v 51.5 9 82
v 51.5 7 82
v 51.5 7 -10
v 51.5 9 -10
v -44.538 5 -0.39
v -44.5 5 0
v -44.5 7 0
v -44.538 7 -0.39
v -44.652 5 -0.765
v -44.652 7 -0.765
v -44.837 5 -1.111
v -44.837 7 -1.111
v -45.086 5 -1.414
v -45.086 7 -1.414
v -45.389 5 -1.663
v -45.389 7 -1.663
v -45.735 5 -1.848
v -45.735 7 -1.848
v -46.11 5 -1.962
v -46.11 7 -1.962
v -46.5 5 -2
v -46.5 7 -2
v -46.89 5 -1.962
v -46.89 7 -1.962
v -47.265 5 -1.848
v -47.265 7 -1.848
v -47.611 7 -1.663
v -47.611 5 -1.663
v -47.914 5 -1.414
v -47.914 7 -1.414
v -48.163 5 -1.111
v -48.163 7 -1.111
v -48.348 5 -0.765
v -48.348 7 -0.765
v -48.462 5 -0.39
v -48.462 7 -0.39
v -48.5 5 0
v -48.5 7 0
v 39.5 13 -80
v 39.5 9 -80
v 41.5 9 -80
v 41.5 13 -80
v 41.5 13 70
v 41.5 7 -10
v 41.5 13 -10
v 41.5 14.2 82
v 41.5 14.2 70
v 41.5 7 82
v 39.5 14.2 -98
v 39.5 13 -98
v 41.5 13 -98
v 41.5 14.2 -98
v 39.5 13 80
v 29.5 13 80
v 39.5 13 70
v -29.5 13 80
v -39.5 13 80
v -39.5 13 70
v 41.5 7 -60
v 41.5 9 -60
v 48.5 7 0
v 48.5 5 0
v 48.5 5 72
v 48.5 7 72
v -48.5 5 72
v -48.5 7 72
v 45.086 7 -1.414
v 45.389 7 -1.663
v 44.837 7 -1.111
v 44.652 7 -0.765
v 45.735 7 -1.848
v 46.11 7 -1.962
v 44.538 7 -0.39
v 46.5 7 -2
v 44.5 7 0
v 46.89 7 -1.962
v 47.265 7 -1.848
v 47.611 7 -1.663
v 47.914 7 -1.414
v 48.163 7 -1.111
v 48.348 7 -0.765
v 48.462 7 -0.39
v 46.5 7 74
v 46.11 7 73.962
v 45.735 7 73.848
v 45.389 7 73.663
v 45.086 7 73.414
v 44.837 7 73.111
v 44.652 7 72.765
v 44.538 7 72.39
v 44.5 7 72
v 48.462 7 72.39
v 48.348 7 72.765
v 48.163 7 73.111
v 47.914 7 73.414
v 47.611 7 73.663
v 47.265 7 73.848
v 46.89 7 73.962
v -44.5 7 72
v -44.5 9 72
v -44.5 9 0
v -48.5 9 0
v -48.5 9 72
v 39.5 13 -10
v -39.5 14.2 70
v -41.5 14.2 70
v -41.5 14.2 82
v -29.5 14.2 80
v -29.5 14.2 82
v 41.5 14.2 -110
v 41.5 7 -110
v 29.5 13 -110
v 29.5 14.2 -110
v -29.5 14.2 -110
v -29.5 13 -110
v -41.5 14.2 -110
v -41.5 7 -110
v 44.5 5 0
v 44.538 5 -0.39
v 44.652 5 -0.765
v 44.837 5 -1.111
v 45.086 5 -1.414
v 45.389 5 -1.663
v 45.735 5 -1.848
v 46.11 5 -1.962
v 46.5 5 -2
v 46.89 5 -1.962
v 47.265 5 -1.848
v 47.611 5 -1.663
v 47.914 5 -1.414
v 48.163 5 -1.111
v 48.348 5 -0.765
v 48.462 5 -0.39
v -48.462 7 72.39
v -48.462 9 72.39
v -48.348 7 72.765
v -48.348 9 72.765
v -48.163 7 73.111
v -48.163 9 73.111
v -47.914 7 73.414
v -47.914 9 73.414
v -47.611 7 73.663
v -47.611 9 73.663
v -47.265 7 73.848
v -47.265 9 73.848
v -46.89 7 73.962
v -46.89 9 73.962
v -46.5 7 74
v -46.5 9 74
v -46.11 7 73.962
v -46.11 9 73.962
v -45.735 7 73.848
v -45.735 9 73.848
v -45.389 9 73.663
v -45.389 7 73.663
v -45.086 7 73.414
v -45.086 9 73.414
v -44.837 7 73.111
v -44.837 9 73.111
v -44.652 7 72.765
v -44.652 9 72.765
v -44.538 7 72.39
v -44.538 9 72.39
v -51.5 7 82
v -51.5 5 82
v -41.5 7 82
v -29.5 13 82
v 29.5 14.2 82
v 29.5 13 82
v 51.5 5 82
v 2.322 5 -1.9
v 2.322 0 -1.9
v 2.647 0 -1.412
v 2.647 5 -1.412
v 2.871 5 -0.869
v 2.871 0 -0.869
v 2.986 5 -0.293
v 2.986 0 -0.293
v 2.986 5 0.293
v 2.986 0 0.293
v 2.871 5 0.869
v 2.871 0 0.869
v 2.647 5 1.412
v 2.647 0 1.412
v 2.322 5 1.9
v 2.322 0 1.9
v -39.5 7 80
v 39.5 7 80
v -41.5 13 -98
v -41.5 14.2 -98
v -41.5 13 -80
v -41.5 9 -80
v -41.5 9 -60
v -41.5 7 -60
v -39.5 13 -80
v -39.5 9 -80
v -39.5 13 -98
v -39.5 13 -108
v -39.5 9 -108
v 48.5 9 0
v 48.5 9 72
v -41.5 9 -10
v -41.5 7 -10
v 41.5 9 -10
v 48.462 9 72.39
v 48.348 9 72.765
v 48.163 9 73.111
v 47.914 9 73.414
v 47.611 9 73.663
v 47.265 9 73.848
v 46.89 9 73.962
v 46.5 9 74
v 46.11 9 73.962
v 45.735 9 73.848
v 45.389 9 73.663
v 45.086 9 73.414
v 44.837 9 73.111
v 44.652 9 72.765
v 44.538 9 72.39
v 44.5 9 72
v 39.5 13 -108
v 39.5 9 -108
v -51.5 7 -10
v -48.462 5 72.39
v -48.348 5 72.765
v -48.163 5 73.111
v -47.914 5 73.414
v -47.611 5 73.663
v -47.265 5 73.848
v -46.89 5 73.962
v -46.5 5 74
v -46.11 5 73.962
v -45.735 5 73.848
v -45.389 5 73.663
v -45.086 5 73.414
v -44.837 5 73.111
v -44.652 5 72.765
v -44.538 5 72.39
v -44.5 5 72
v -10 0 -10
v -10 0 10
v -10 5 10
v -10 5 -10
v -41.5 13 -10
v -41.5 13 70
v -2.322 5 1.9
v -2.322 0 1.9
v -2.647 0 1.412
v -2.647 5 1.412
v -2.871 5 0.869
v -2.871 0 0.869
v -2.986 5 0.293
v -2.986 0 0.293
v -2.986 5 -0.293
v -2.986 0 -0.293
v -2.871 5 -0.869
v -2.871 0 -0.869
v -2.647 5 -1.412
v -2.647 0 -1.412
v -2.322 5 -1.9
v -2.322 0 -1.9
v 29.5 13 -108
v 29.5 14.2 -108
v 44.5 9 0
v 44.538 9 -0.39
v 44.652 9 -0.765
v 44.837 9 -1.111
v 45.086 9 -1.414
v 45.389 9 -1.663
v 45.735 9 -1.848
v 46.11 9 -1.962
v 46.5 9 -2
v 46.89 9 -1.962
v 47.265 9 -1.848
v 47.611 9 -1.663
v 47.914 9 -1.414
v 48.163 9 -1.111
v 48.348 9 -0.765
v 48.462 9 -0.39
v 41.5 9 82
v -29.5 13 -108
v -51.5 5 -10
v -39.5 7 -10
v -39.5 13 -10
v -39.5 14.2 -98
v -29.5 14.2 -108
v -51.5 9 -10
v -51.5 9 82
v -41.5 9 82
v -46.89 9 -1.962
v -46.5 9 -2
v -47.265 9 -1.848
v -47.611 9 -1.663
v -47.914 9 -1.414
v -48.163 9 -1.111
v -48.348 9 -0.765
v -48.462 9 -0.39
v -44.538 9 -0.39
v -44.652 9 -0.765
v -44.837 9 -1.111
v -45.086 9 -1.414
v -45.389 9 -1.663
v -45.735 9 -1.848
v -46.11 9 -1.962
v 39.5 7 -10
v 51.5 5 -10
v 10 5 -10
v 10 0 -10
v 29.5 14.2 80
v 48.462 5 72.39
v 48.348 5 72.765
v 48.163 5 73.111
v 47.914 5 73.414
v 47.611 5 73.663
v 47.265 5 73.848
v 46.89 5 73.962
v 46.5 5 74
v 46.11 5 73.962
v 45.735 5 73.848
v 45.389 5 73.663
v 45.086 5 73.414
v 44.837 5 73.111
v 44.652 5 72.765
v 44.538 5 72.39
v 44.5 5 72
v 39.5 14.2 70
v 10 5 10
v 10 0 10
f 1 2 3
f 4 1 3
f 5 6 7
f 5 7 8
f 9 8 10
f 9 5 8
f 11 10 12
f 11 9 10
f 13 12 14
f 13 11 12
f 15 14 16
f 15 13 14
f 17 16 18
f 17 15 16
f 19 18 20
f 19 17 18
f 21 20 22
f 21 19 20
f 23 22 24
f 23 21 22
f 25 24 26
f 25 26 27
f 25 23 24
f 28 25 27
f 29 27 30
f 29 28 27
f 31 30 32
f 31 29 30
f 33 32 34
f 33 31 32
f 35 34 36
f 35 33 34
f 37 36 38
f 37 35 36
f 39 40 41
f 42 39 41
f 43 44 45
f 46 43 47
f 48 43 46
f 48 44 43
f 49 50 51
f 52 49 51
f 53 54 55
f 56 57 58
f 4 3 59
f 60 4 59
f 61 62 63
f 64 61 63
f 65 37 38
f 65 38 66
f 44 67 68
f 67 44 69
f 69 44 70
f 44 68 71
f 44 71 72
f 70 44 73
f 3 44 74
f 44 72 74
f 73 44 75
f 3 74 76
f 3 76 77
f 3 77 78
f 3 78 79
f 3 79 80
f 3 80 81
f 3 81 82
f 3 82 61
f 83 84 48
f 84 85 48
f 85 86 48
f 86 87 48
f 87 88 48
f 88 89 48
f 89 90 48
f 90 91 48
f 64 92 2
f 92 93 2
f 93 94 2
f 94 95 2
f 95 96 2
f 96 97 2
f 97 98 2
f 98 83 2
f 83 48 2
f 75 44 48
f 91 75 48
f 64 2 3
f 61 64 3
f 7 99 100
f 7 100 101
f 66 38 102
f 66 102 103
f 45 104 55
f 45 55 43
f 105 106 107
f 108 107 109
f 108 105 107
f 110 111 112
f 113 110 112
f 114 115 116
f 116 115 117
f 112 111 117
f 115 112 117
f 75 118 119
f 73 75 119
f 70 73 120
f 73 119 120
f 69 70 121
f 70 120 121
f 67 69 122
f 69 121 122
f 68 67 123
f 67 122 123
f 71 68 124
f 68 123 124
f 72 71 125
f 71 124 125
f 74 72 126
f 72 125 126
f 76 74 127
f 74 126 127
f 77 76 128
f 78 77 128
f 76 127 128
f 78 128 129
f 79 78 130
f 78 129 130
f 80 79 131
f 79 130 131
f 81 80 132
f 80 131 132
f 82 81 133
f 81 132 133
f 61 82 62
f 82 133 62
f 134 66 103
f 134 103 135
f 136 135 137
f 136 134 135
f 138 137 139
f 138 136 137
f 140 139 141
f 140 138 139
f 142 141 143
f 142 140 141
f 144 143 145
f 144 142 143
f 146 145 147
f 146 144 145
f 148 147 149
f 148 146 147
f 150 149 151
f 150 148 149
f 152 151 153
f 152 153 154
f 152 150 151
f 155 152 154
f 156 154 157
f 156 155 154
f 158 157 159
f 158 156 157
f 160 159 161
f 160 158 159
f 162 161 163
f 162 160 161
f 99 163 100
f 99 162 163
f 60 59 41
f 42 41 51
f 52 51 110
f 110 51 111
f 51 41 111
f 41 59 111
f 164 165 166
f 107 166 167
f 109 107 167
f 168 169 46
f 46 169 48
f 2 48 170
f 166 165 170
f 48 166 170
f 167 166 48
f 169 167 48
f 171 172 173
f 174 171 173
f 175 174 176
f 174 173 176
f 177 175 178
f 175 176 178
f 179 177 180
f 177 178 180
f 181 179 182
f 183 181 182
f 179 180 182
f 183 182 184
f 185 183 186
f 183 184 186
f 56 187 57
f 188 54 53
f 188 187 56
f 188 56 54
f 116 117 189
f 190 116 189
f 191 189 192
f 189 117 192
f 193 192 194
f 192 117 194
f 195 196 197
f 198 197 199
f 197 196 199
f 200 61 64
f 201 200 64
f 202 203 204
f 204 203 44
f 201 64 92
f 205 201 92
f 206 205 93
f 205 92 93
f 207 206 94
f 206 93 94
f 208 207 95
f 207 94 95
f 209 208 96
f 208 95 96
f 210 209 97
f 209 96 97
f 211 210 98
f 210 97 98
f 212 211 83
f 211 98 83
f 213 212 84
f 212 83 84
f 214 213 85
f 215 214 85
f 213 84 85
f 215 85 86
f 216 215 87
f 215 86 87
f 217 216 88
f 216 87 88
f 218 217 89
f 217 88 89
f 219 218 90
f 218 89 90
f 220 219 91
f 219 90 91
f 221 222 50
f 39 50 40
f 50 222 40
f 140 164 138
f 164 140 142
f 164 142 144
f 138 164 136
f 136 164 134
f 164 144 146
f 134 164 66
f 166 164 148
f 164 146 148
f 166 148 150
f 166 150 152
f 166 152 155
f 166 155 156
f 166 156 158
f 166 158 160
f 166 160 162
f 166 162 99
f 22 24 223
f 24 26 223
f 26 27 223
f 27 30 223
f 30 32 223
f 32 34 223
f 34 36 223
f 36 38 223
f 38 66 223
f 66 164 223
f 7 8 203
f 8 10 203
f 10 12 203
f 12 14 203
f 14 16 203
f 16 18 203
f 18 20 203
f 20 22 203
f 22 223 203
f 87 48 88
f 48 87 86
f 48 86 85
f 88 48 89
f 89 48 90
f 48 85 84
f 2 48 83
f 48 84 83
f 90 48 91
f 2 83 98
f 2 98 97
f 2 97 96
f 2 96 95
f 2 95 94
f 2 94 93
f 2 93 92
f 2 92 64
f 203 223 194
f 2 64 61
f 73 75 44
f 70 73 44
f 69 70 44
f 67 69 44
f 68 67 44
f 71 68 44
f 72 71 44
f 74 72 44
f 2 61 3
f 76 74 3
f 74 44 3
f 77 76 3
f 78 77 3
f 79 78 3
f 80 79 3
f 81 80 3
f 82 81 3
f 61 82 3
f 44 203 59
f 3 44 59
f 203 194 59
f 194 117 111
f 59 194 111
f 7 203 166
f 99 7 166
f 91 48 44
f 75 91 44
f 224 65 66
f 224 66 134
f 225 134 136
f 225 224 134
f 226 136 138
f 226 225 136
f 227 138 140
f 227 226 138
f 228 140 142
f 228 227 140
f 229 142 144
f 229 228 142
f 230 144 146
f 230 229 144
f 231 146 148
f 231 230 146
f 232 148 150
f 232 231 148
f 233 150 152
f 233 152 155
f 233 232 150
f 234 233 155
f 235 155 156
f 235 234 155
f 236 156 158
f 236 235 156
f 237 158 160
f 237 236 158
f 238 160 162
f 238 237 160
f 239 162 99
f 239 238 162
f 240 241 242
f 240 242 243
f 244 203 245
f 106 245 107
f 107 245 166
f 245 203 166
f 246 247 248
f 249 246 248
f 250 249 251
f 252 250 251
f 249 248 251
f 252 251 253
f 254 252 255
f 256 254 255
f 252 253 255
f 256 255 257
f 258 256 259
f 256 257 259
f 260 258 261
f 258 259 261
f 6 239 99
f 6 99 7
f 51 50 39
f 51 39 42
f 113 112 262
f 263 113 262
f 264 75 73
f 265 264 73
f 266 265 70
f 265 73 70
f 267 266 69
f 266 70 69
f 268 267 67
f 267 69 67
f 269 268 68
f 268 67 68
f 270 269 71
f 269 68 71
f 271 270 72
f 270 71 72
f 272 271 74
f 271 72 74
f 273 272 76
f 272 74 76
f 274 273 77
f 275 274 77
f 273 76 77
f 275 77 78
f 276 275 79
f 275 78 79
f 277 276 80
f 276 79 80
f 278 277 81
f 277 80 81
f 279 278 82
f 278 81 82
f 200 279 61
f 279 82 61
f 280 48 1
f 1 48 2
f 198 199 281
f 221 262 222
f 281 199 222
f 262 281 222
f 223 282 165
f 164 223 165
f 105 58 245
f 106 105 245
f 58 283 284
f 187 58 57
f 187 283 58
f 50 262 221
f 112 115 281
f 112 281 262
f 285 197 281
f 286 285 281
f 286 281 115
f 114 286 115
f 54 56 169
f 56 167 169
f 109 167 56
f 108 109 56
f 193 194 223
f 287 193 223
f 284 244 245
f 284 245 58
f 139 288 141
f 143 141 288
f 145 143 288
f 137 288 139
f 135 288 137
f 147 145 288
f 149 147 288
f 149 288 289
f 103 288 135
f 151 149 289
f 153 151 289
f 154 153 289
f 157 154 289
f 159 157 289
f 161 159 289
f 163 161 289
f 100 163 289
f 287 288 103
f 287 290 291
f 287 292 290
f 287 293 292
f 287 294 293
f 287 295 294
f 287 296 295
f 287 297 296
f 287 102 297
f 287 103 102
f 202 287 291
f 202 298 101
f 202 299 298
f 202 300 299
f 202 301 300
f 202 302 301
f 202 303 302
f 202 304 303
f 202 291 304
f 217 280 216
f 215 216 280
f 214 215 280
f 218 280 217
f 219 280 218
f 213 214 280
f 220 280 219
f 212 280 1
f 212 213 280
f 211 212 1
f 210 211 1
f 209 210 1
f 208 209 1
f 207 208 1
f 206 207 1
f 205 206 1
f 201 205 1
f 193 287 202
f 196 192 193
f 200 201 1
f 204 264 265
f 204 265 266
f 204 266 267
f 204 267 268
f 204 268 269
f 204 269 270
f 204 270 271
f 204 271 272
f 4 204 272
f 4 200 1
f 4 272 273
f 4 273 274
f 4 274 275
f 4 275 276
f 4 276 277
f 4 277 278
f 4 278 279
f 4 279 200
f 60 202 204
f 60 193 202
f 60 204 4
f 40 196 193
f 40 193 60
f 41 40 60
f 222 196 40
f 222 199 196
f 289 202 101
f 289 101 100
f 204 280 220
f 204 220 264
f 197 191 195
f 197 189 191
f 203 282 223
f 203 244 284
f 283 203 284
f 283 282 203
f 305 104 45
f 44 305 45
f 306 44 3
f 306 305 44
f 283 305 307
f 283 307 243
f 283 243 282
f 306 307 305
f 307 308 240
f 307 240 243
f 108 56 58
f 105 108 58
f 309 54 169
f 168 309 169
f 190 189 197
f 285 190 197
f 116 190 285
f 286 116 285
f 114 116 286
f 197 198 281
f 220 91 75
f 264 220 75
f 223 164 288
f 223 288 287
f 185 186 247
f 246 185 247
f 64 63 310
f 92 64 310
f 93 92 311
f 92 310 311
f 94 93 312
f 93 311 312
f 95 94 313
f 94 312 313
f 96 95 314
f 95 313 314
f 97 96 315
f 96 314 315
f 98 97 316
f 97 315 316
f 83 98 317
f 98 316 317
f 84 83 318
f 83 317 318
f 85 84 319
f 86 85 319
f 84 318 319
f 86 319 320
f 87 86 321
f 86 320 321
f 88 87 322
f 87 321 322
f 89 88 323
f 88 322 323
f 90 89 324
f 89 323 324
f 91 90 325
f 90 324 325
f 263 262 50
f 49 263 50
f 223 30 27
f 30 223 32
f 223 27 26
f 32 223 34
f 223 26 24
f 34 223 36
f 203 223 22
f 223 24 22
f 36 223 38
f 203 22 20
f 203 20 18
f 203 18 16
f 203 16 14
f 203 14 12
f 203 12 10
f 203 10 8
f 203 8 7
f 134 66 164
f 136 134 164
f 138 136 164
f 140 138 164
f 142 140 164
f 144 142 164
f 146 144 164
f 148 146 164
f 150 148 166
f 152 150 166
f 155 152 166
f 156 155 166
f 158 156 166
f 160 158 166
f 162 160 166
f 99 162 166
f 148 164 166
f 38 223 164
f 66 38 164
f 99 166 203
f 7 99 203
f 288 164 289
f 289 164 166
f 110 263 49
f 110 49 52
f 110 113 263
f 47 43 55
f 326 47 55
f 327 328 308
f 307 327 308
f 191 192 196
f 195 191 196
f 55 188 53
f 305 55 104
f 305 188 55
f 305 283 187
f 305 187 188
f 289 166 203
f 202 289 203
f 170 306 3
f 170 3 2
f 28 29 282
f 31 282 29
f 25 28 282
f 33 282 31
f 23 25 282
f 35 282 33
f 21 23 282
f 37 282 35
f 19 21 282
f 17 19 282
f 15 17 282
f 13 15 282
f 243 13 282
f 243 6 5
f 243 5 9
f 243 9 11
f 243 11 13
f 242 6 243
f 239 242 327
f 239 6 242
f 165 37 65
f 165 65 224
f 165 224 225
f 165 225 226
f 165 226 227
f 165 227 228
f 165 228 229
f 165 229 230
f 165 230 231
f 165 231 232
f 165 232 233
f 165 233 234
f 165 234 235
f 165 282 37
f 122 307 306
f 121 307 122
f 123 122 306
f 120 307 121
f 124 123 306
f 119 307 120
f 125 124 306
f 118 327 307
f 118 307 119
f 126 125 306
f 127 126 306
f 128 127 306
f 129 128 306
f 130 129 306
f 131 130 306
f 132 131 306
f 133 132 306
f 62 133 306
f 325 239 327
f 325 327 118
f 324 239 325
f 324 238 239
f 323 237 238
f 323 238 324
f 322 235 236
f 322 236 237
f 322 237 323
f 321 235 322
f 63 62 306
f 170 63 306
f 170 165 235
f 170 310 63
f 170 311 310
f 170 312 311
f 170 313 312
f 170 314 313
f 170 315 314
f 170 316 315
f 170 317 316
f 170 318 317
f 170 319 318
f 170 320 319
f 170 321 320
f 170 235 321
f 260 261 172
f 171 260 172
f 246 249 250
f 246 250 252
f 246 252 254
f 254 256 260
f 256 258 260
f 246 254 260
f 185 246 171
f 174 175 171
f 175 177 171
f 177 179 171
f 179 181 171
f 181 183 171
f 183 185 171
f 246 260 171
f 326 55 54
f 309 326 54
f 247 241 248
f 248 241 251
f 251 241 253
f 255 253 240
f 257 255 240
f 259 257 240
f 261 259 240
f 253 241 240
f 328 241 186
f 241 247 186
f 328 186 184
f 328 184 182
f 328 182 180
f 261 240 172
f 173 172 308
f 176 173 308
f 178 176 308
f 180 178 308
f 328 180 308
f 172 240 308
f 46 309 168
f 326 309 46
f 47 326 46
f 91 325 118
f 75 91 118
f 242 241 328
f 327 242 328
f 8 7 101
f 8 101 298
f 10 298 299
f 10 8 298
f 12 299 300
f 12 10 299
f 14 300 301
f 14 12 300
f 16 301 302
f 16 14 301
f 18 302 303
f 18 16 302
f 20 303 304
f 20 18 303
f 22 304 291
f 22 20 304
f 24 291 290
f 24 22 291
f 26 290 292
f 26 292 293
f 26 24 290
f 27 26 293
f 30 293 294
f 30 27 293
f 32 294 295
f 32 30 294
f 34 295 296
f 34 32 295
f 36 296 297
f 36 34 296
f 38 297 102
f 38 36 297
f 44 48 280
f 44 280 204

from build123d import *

# Parameters (mm, degrees)
CROQUIS1_W              = 20
CROQUIS1_H              = 20
CROQUIS1_R              = 3
SALIENTE_EXTRUIR1_DEPTH = 5
SALIENTE_EXTRUIR2_DEPTH = 2
SALIENTE_EXTRUIR3_DEPTH = 8
SALIENTE_EXTRUIR4_DEPTH = 1.2
CROQUIS5_W              = 10
CROQUIS5_H              = 92
SALIENTE_EXTRUIR5_DEPTH = 2
CROQUIS6_W              = 83
CROQUIS6_H              = 100
CROQUIS6_W_2            = 10
CROQUIS6_H_2            = 92
SALIENTE_EXTRUIR6_DEPTH = 2
SALIENTE_EXTRUIR7_DEPTH = 4
SALIENTE_EXTRUIR8_DEPTH = 1.2


with BuildPart() as part:
    # Croquis1 → Saliente-Extruir1 (new body)
    with BuildSketch(Plane(origin=(0, 0, 0), x_dir=(1, 0, 0), z_dir=(0, 1, 0))):
        Rectangle(CROQUIS1_W, CROQUIS1_H)
        Circle(CROQUIS1_R, mode=Mode.SUBTRACT)
        with BuildLine():
            Line((2.321637353, -1.9), (-2.321637353, -1.9))
            ThreePointArc((-2.321637353, -1.9), (0, -3), (2.321637353, -1.9))
        make_face()
        with BuildLine():
            Line((-2.321637353, 1.9), (2.321637353, 1.9))
            ThreePointArc((2.321637353, 1.9), (0, 3), (-2.321637353, 1.9))
        make_face()
    extrude(amount=SALIENTE_EXTRUIR1_DEPTH)

    # Croquis2 → Saliente-Extruir2 (add)
    with BuildSketch(Plane(origin=(0, 5, 0), x_dir=(1, 0, 0), z_dir=(0, 1, 0))):
        Polygon((-10, 10), (-39.5, 10), (-39.5, 0), (-39.5, -80), (39.5, -80), (39.5, 0), (39.5, 10), (10, 10), align=None)
    extrude(amount=SALIENTE_EXTRUIR2_DEPTH)

    # Croquis3 → Saliente-Extruir3 (add)
    with BuildSketch(Plane.XZ.offset(-5)):
        Polygon((39.5, 80), (39.5, -10), (41.5, -10), (41.5, 82), (-41.5, 82), (-41.5, -10), (-39.5, -10), (-39.5, 80), align=None)
    extrude(amount=-SALIENTE_EXTRUIR3_DEPTH)

    # Croquis4 → Saliente-Extruir4 (add)
    with BuildSketch(Plane(origin=(0, 13, 0), x_dir=(1, 0, 0), z_dir=(0, 1, 0))):
        Polygon((-39.5, -80), (-29.5, -80), (-39.5, -70), align=None)
        Polygon((-29.5, -82), (-29.5, -80), (-39.5, -80), (-39.5, -70), (-41.5, -70), (-41.5, -82), align=None)
        Polygon((39.5, -70), (29.5, -80), (39.5, -80), align=None)
        Polygon((39.5, -80), (29.5, -80), (29.5, -82), (41.5, -82), (41.5, -70), (39.5, -70), align=None)
    extrude(amount=SALIENTE_EXTRUIR4_DEPTH)

    # Croquis5 → Saliente-Extruir5 (add)
    with BuildSketch(Plane.XZ.offset(-5)):
        with Locations((-46.5, 36)):
            Rectangle(CROQUIS5_W, CROQUIS5_H)
        with BuildLine():
            Line((-48.5, 0), (-48.5, 72))
            ThreePointArc((-48.5, 72), (-46.5, 74), (-44.5, 72))
            Line((-44.5, 72), (-44.5, 0))
            ThreePointArc((-44.5, 0), (-46.5, -2), (-48.5, 0))
        make_face(mode=Mode.SUBTRACT)
        with Locations((46.5, 36)):
            Rectangle(CROQUIS5_W, CROQUIS5_H)
        with BuildLine():
            Line((48.5, 0), (48.5, 72))
            ThreePointArc((48.5, 72), (46.5, 74), (44.5, 72))
            Line((44.5, 72), (44.5, 0))
            ThreePointArc((44.5, 0), (46.5, -2), (48.5, 0))
        make_face(mode=Mode.SUBTRACT)
    extrude(amount=-SALIENTE_EXTRUIR5_DEPTH)


with BuildPart() as body_2:
    # Croquis6 → Saliente-Extruir6 (new body)
    with BuildSketch(Plane(origin=(0, 7, 0), x_dir=(1, 0, 0), z_dir=(0, 1, 0))):
        with Locations((0, 60)):
            Rectangle(CROQUIS6_W, CROQUIS6_H)
        Polygon((-51.5, 10), (-41.5, 10), (-41.5, 60), align=None)
        Polygon((41.5, 60), (41.5, 10), (51.5, 10), align=None)
        with Locations((46.5, -36)):
            Rectangle(CROQUIS6_W_2, CROQUIS6_H_2)
        with BuildLine():
            Line((44.5, -72), (44.5, 0))
            ThreePointArc((44.5, 0), (46.5, 2), (48.5, 0))
            Line((48.5, 0), (48.5, -72))
            ThreePointArc((48.5, -72), (46.5, -74), (44.5, -72))
        make_face(mode=Mode.SUBTRACT)
        with Locations((-46.5, -36)):
            Rectangle(CROQUIS6_W_2, CROQUIS6_H_2)
        with BuildLine():
            ThreePointArc((-44.5, 0), (-46.5, 2), (-48.5, 0))
            Line((-48.5, 0), (-48.5, -72))
            ThreePointArc((-48.5, -72), (-46.5, -74), (-44.5, -72))
            Line((-44.5, -72), (-44.5, 0))
        make_face(mode=Mode.SUBTRACT)
    extrude(amount=SALIENTE_EXTRUIR6_DEPTH)

    # Croquis7 → Saliente-Extruir7 (add)
    with BuildSketch(Plane(origin=(0, 9, 0), x_dir=(1, 0, 0), z_dir=(0, 1, 0))):
        Polygon((-39.5, 80), (-39.5, 108), (39.5, 108), (39.5, 80), (41.5, 80), (41.5, 110), (-41.5, 110), (-41.5, 80), align=None)
    extrude(amount=SALIENTE_EXTRUIR7_DEPTH)

    # Croquis8 → Saliente-Extruir8 (add)
    with BuildSketch(Plane(origin=(0, 13, 0), x_dir=(1, 0, 0), z_dir=(0, 1, 0))):
        Polygon((-39.5, 98), (-29.5, 108), (-29.5, 110), (-41.5, 110), (-41.5, 98), align=None)
        Polygon((29.5, 108), (39.5, 98), (41.5, 98), (41.5, 110), (29.5, 110), align=None)
    extrude(amount=SALIENTE_EXTRUIR8_DEPTH)


solid = Compound([part.part, body_2.part])
